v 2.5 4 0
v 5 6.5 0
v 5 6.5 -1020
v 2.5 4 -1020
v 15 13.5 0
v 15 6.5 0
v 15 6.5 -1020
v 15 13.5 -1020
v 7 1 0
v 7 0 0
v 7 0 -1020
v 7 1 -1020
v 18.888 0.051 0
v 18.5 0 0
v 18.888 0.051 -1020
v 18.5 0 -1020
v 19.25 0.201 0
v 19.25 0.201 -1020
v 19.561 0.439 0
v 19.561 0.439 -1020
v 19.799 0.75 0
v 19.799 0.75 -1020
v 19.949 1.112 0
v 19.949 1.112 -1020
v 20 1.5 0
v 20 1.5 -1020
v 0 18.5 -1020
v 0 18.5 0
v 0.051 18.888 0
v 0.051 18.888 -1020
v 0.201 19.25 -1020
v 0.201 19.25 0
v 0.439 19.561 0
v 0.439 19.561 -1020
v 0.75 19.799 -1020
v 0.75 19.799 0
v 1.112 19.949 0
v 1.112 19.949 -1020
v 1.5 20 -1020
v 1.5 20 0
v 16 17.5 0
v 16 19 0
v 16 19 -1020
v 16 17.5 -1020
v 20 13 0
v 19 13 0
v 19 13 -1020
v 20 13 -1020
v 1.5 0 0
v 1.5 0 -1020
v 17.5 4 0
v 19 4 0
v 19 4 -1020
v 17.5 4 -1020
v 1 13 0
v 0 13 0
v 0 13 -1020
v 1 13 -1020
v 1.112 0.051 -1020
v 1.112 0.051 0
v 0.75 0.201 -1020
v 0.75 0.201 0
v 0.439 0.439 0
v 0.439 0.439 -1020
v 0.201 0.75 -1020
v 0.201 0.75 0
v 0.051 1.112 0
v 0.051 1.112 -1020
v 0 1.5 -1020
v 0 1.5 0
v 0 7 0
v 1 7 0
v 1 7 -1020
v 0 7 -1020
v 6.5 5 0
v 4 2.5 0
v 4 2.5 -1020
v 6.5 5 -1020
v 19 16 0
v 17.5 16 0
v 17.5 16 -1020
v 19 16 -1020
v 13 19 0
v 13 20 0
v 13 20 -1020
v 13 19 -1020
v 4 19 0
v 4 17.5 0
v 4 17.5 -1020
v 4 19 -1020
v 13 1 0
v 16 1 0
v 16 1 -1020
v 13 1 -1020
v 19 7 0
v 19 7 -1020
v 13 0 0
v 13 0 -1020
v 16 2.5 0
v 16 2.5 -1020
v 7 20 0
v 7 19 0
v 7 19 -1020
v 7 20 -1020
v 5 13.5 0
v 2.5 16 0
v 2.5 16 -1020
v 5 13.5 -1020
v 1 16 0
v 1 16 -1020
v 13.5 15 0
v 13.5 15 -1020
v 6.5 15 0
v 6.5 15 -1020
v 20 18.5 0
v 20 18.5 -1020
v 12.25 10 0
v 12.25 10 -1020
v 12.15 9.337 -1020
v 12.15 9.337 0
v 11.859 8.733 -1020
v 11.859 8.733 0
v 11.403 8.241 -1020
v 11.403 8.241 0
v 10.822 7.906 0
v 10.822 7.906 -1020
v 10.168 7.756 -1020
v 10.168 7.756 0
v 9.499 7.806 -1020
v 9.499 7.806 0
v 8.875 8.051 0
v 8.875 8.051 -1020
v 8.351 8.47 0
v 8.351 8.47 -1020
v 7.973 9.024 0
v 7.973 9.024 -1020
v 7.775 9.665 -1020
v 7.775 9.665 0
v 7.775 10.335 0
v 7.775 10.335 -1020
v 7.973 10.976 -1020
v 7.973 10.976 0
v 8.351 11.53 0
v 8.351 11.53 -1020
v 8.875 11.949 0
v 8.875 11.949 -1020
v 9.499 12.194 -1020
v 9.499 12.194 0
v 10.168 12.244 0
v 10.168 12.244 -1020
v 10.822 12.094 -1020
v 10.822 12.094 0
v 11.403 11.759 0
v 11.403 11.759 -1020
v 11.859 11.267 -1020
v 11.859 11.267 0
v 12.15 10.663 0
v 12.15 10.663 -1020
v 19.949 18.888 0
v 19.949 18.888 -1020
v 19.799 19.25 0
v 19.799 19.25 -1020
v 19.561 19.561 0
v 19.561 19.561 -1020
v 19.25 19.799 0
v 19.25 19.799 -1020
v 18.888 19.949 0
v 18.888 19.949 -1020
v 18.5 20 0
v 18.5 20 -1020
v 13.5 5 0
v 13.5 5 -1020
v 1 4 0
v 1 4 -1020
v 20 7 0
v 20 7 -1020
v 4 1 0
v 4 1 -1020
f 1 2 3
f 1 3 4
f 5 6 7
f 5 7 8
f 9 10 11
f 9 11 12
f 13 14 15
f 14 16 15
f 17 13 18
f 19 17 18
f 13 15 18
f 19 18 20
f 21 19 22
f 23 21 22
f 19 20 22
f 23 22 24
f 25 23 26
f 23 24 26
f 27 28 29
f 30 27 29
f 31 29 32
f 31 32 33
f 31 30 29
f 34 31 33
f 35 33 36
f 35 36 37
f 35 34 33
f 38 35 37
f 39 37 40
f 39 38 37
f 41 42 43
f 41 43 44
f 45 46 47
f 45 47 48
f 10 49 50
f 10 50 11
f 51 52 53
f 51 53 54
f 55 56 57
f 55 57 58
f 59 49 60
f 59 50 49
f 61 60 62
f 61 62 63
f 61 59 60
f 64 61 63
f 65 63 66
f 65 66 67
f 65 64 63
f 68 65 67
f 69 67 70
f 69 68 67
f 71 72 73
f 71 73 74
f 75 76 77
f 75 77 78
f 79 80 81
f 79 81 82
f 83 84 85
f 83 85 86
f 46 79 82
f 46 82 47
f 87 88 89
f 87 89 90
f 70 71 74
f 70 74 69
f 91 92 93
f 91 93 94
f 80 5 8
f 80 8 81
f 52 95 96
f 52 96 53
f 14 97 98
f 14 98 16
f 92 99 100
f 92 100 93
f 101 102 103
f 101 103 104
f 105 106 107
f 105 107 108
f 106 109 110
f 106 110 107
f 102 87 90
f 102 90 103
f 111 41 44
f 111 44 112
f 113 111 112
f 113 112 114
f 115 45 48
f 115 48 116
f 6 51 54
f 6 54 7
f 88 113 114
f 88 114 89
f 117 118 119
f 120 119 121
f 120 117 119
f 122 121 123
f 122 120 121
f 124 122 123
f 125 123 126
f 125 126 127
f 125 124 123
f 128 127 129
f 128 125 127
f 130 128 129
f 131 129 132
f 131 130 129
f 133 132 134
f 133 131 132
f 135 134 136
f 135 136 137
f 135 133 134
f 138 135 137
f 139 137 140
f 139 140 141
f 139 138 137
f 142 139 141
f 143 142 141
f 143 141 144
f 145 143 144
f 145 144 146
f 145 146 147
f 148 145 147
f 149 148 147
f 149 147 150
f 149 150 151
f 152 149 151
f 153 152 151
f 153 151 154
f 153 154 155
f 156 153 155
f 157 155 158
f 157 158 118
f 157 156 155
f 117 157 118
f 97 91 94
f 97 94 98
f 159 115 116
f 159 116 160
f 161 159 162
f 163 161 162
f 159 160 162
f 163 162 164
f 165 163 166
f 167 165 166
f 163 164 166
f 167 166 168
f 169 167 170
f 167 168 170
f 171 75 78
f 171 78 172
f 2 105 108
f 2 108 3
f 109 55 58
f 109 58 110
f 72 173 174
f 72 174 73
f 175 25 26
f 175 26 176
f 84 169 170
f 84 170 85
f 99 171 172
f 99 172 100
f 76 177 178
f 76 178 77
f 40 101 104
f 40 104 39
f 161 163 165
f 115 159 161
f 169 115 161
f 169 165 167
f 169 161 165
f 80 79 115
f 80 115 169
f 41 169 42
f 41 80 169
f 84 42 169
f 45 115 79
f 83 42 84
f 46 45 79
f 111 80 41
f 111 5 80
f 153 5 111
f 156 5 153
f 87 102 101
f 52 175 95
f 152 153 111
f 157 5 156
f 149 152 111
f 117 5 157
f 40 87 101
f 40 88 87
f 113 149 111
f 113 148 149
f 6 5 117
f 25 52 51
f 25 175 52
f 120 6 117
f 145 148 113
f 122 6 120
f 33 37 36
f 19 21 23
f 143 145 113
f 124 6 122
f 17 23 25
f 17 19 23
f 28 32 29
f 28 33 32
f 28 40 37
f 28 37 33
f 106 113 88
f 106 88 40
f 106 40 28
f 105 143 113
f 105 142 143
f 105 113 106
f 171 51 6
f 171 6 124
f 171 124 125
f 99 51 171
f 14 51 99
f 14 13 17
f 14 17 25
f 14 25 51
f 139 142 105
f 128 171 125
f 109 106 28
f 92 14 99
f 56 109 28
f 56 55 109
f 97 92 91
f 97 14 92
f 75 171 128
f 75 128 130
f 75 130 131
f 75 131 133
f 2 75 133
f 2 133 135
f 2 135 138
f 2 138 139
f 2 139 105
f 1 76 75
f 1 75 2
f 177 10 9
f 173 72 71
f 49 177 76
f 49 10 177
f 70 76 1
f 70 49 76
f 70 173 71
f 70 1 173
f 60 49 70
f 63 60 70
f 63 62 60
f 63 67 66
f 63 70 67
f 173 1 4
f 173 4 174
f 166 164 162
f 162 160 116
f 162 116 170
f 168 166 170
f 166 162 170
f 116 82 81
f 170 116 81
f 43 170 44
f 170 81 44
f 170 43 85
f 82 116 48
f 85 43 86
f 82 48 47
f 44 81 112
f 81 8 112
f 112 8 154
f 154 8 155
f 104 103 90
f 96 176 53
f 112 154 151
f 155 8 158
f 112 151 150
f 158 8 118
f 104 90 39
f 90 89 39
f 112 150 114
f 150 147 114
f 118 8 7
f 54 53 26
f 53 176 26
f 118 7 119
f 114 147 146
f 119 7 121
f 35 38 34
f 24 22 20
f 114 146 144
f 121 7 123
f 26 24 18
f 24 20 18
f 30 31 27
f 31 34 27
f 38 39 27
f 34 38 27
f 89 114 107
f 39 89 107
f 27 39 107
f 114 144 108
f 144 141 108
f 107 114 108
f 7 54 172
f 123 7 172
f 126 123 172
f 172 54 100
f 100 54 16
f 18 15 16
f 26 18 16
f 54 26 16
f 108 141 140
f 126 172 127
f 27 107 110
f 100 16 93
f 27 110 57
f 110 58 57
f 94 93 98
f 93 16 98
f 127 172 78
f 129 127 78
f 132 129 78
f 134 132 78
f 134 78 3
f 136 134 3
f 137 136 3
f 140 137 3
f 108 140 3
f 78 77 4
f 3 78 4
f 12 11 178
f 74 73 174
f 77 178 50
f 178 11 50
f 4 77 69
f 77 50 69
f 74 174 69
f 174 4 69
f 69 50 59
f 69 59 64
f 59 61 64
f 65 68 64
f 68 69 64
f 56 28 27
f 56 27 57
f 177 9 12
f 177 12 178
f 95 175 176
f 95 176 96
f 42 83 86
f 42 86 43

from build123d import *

# Parameters (mm, degrees)
SKETCH_R  = 2.25
PAD_DEPTH = 1020
FILLET_R  = 1.5


with BuildPart() as part:
    # Sketch → Pad (new body)
    with BuildSketch(Plane(origin=(0, 0, 0), x_dir=(1, 0, 0), z_dir=(0, 0, -1))):
        Polygon((7, 0), (7, -1), (4, -1), (4, -2.5), (6.499998, -5), (13.500002, -5), (16, -2.5), (16, -1), (13, -1), (13, 0), (20, 0), (20, -7), (19, -7), (19, -4), (17.5, -4), (15.000002, -6.5), (15.000002, -13.500005), (17.5, -16.000005), (19, -16.000005), (19, -13.000005), (20, -13.000005), (20, -20.000005), (13, -20.000005), (13, -19.000005), (16, -19.000005), (16, -17.500005), (13.500002, -15.000005), (6.499998, -15.000005), (4, -17.500005), (4, -19.000005), (7, -19.000005), (7, -20.000005), (0, -20.000005), (0, -13.000005), (1, -13.000005), (1, -16.000005), (2.5, -16.000005), (4.999998, -13.500005), (4.999998, -6.5), (2.5, -4), (1, -4), (1, -7), (0, -7), (0, 0), align=None)
        with Locations((10, -10.000002)):
            Circle(SKETCH_R, mode=Mode.SUBTRACT)
    extrude(amount=PAD_DEPTH)

    # Fillet
    fillet_edges = [part.edges().sort_by_distance(p)[0] for p in [
        (20, 20.000005, -510),
        (20, 0, -510),
        (0, 20.000005, -510),
        (0, 0, -510),
    ]]
    fillet(fillet_edges, radius=FILLET_R)


solid = part.part
